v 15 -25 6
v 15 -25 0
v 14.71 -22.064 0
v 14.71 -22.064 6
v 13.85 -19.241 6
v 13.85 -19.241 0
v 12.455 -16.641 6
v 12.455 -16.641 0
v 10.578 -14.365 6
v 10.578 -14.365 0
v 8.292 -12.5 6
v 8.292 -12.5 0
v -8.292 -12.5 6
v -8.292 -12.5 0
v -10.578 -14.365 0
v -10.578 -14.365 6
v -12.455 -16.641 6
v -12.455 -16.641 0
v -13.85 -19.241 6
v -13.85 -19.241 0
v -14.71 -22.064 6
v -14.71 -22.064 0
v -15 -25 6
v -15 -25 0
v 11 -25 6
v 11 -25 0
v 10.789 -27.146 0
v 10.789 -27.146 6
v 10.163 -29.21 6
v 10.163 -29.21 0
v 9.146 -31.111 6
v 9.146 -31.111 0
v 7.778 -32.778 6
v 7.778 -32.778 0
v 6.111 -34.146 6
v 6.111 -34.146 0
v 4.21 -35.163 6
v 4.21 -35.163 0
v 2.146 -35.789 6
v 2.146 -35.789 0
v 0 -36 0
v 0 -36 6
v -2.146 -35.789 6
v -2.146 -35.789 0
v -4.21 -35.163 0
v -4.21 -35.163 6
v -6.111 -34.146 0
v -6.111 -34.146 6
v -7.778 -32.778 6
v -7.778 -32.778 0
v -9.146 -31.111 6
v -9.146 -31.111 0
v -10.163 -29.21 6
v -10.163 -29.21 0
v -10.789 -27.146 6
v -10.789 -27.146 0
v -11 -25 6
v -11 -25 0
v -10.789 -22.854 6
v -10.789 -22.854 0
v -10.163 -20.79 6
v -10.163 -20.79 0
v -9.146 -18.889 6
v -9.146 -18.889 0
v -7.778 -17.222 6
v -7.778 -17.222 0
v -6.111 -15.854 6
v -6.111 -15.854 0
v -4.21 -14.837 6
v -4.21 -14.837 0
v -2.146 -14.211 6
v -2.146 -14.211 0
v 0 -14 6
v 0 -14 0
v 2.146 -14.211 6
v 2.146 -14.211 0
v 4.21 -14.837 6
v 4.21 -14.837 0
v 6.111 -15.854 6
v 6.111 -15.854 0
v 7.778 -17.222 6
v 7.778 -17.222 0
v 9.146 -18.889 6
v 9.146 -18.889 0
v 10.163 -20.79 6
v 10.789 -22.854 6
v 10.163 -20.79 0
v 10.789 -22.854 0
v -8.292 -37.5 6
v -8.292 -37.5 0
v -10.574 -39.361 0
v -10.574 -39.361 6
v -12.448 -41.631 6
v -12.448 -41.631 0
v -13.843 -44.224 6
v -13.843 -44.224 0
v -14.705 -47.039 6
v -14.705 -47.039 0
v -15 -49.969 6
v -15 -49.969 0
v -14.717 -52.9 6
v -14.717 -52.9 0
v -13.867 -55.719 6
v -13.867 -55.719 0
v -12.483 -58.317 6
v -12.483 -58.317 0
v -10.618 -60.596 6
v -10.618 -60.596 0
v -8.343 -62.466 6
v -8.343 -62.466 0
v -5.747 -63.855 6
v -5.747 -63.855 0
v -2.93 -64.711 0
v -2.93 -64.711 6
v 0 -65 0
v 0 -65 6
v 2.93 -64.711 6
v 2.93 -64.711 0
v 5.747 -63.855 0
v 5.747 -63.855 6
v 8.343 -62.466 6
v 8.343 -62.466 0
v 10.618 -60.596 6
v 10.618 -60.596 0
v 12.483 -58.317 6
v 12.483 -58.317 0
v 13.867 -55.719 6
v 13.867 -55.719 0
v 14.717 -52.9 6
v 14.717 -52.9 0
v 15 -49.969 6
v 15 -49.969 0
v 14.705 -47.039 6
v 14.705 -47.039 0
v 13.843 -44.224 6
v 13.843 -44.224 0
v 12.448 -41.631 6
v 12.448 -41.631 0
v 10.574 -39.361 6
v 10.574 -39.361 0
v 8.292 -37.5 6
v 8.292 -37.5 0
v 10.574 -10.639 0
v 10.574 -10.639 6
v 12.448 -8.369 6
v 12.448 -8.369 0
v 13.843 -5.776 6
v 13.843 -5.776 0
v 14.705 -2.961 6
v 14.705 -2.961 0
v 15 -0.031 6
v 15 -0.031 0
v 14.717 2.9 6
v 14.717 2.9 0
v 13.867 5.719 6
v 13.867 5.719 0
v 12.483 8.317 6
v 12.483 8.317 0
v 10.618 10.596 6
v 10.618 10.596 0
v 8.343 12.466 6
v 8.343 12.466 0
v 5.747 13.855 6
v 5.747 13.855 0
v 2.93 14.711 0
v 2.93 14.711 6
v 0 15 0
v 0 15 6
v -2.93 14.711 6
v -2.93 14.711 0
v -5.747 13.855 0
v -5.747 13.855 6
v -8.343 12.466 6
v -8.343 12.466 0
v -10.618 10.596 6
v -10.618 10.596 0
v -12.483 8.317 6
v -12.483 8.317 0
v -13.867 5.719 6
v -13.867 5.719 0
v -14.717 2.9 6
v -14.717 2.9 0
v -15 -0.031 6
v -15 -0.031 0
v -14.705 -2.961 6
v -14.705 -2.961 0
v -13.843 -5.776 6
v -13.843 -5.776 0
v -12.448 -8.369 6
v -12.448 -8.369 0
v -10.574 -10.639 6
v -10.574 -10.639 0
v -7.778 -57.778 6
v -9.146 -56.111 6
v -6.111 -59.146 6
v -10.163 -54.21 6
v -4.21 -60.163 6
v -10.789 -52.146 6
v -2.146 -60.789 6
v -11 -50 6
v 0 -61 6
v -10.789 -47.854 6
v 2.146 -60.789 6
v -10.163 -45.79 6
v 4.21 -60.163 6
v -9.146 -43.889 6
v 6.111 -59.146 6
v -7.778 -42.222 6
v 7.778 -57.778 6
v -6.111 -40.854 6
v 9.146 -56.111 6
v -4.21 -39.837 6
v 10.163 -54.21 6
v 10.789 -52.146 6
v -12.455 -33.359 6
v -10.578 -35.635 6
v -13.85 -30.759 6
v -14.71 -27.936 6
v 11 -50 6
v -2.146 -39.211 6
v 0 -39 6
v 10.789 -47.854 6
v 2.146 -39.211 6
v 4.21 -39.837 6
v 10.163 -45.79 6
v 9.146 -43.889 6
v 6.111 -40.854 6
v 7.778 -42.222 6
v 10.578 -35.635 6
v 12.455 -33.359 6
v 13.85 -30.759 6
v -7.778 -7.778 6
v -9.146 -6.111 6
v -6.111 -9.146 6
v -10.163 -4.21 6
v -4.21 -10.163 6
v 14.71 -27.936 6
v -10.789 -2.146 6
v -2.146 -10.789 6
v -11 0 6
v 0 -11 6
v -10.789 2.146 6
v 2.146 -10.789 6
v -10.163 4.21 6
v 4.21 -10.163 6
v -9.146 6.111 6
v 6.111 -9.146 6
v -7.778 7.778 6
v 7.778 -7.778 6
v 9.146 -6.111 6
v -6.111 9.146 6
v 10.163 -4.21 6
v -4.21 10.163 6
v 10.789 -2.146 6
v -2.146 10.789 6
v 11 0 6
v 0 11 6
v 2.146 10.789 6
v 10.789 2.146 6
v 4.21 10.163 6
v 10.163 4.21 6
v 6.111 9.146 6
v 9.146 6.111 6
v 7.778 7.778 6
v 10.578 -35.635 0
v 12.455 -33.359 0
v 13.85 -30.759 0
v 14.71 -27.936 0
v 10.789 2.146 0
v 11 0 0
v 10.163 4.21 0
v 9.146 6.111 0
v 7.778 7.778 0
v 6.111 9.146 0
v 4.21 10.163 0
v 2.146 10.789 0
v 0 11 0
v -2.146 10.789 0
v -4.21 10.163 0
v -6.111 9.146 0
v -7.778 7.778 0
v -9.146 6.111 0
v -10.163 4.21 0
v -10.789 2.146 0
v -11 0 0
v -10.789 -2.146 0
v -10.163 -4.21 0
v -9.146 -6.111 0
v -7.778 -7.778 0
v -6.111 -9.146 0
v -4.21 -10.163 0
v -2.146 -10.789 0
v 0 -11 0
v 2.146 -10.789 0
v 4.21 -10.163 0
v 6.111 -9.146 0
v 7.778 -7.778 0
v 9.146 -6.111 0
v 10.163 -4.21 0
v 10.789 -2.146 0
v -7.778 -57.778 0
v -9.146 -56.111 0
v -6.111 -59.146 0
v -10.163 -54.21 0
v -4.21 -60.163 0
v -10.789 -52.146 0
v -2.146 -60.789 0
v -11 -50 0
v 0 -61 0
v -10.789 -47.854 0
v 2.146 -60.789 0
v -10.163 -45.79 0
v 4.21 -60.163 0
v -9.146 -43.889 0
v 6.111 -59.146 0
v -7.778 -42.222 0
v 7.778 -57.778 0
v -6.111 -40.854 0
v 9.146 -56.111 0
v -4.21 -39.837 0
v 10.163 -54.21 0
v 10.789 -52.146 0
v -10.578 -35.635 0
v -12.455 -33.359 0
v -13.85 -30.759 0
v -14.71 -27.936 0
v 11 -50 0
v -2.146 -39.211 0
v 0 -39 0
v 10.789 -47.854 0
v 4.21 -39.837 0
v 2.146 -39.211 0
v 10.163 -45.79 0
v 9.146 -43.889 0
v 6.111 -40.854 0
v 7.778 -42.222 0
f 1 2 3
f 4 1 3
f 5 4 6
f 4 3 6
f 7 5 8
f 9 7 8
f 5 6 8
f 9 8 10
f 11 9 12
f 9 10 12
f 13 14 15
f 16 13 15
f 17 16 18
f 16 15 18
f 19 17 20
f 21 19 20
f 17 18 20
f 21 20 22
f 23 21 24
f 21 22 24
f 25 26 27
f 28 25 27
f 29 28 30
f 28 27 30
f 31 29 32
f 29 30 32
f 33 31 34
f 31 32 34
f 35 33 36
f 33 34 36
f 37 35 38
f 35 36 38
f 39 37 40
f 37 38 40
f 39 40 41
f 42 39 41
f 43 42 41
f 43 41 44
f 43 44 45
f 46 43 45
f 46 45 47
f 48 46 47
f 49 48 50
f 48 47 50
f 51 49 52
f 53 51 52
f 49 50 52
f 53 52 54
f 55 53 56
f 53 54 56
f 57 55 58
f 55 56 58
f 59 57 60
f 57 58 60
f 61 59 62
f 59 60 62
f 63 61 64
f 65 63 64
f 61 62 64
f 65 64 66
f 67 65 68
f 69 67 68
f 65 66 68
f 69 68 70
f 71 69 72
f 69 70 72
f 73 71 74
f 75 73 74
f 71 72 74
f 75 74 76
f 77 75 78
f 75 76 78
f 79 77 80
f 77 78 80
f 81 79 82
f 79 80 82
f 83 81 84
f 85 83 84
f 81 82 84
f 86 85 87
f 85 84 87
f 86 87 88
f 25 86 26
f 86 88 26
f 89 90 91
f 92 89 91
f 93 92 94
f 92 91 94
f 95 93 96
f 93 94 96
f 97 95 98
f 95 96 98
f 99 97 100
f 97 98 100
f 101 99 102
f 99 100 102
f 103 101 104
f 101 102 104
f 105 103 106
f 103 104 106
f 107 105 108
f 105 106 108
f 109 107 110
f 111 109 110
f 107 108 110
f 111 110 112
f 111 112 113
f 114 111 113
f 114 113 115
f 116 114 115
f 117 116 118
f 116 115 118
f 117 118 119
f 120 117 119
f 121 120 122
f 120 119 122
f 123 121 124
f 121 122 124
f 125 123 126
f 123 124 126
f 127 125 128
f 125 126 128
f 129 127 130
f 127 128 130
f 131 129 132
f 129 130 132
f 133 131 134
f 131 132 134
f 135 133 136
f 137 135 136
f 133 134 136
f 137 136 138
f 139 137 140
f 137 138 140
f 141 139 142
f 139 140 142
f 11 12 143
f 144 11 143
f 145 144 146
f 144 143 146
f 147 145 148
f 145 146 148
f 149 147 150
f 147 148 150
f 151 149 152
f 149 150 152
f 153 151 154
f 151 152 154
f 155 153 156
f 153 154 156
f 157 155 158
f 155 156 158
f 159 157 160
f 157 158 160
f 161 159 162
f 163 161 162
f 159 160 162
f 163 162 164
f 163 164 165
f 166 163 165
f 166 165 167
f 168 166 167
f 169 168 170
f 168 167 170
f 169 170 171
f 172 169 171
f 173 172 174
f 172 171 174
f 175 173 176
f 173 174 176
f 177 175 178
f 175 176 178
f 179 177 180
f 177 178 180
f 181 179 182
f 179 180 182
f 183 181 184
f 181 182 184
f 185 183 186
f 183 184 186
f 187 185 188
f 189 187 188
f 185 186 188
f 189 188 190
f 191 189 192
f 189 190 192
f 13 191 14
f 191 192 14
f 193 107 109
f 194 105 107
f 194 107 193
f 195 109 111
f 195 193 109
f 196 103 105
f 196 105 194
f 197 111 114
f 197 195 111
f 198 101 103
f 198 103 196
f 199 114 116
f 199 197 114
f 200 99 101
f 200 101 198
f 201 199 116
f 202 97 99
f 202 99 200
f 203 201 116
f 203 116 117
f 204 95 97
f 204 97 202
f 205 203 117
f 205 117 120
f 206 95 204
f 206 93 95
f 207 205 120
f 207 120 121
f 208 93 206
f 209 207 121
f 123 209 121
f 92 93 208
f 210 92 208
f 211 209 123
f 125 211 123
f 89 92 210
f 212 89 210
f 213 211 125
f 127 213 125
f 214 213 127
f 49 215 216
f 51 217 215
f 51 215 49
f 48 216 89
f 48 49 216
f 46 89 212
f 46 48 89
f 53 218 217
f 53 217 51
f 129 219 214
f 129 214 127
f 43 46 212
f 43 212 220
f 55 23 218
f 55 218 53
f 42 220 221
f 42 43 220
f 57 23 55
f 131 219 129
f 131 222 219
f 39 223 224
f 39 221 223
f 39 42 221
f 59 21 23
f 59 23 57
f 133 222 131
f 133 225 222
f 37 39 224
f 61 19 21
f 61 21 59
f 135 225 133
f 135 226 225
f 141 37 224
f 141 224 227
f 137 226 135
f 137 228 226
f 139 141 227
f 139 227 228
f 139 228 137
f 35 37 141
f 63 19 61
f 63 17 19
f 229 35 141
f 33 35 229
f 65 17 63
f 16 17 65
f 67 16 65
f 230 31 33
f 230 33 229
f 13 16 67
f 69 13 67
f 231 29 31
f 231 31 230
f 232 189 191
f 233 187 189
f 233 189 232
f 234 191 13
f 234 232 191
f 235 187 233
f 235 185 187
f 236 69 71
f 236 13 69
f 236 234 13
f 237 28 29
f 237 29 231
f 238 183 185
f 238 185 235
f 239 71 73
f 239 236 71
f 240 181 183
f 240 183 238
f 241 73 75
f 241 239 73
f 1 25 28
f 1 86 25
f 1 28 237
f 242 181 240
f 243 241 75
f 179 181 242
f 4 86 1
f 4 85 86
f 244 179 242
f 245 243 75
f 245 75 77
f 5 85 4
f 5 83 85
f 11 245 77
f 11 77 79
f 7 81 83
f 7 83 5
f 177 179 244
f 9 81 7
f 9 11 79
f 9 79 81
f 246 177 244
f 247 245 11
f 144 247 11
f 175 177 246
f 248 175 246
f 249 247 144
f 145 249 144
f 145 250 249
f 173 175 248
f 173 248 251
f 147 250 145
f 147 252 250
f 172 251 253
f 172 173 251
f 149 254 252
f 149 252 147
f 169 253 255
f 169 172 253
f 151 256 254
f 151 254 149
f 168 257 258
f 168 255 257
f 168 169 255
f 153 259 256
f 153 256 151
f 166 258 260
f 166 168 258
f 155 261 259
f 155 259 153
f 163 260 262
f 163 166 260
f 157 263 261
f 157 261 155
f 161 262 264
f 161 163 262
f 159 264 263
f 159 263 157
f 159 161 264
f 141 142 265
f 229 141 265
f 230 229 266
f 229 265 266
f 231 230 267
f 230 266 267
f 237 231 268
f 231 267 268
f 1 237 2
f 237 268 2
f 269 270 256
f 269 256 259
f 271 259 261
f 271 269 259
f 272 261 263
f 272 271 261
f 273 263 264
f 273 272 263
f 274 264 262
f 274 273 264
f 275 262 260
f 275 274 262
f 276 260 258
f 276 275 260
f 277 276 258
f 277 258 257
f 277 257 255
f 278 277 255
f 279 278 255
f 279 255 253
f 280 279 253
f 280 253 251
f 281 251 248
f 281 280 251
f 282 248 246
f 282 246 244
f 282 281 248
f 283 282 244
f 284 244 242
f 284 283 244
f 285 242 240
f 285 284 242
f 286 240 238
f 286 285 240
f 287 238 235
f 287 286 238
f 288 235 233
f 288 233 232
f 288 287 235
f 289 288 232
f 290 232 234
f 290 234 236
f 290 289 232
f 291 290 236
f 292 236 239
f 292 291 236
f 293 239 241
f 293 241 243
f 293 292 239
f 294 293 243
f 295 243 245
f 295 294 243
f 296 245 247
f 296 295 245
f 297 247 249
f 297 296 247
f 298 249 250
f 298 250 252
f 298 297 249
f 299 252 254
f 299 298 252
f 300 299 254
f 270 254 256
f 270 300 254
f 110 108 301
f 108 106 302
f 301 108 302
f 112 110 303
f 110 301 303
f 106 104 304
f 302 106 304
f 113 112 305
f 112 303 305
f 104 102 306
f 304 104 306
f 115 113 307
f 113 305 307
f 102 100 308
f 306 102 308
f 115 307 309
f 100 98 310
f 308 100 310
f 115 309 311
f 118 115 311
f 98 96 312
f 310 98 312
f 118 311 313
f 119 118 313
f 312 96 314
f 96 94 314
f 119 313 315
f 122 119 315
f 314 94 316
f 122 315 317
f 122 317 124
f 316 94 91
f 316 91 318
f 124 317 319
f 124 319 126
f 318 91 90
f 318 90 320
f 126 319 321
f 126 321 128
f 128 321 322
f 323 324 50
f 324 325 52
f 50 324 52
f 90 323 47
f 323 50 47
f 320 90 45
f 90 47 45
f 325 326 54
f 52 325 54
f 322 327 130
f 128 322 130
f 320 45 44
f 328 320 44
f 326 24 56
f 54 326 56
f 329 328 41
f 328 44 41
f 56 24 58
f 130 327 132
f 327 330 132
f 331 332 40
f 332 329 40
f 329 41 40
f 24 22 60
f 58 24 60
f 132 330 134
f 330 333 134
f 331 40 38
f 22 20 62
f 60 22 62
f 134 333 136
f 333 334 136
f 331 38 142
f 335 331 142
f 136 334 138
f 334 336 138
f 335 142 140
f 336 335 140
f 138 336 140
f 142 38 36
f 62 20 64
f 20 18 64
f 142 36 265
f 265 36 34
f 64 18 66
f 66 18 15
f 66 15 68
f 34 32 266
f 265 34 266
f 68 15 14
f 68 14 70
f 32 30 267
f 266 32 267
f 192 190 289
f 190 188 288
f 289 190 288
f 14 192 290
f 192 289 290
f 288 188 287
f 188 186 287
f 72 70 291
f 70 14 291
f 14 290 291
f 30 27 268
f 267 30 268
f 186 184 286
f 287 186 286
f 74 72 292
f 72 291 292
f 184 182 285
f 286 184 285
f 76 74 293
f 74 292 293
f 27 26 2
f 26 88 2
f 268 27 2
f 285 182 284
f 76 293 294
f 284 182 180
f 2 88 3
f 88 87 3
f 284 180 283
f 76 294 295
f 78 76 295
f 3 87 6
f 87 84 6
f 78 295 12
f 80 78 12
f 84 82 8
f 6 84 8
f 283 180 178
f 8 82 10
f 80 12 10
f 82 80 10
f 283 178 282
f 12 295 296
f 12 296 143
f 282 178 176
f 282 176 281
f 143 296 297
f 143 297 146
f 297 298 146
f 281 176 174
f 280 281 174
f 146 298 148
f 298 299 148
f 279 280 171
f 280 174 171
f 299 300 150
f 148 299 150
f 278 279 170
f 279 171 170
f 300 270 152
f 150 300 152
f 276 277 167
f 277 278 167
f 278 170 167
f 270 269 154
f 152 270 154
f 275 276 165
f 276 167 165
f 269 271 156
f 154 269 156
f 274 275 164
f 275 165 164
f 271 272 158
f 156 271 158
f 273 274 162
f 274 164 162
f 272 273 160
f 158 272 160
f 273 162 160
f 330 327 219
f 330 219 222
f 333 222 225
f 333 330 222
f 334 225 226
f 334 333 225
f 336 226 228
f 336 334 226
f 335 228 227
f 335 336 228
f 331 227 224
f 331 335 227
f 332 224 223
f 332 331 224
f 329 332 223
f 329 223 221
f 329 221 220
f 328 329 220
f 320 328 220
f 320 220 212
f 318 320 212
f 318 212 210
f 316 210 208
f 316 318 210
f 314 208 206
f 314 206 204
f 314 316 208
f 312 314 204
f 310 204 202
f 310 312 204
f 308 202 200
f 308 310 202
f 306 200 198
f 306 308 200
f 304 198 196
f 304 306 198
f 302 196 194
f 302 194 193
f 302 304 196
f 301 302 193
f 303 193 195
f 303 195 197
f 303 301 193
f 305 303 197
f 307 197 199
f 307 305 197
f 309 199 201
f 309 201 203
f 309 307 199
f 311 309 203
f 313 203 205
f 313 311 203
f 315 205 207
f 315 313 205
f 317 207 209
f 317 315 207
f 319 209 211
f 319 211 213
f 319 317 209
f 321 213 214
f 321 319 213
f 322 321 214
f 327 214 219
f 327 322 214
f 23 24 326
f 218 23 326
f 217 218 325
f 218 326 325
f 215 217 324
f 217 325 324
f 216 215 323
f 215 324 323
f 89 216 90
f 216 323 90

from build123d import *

# Parameters (mm, degrees)
F0_R     = 11
F1_DEPTH = 6


with BuildPart() as f1:
    # F0 (on Top) → F1 (new body)
    with BuildSketch(Plane.XY):
        with BuildLine():
            ThreePointArc((8.291562, -12.5), (0, 15), (-8.291562, -12.5))
            ThreePointArc((-8.291562, -12.5), (-13.21691, -17.906814), (-15, -25))
            ThreePointArc((-15, -25), (-13.21691, -32.093186), (-8.291562, -37.5))
            ThreePointArc((-8.291562, -37.5), (0, -65), (8.291562, -37.5))
            ThreePointArc((8.291562, -37.5), (13.21691, -32.093186), (15, -25))
            ThreePointArc((15, -25), (13.21691, -17.906814), (8.291562, -12.5))
        make_face()
        with Locations((0, -50)):
            Circle(F0_R, mode=Mode.SUBTRACT)
        with BuildLine():
            ThreePointArc((-11, -25), (0, -14), (11, -25))
            ThreePointArc((11, -25), (0, -36), (-11, -25))
        make_face(mode=Mode.SUBTRACT)
        Circle(F0_R, mode=Mode.SUBTRACT)
    extrude(amount=F1_DEPTH)


solid = f1.part
